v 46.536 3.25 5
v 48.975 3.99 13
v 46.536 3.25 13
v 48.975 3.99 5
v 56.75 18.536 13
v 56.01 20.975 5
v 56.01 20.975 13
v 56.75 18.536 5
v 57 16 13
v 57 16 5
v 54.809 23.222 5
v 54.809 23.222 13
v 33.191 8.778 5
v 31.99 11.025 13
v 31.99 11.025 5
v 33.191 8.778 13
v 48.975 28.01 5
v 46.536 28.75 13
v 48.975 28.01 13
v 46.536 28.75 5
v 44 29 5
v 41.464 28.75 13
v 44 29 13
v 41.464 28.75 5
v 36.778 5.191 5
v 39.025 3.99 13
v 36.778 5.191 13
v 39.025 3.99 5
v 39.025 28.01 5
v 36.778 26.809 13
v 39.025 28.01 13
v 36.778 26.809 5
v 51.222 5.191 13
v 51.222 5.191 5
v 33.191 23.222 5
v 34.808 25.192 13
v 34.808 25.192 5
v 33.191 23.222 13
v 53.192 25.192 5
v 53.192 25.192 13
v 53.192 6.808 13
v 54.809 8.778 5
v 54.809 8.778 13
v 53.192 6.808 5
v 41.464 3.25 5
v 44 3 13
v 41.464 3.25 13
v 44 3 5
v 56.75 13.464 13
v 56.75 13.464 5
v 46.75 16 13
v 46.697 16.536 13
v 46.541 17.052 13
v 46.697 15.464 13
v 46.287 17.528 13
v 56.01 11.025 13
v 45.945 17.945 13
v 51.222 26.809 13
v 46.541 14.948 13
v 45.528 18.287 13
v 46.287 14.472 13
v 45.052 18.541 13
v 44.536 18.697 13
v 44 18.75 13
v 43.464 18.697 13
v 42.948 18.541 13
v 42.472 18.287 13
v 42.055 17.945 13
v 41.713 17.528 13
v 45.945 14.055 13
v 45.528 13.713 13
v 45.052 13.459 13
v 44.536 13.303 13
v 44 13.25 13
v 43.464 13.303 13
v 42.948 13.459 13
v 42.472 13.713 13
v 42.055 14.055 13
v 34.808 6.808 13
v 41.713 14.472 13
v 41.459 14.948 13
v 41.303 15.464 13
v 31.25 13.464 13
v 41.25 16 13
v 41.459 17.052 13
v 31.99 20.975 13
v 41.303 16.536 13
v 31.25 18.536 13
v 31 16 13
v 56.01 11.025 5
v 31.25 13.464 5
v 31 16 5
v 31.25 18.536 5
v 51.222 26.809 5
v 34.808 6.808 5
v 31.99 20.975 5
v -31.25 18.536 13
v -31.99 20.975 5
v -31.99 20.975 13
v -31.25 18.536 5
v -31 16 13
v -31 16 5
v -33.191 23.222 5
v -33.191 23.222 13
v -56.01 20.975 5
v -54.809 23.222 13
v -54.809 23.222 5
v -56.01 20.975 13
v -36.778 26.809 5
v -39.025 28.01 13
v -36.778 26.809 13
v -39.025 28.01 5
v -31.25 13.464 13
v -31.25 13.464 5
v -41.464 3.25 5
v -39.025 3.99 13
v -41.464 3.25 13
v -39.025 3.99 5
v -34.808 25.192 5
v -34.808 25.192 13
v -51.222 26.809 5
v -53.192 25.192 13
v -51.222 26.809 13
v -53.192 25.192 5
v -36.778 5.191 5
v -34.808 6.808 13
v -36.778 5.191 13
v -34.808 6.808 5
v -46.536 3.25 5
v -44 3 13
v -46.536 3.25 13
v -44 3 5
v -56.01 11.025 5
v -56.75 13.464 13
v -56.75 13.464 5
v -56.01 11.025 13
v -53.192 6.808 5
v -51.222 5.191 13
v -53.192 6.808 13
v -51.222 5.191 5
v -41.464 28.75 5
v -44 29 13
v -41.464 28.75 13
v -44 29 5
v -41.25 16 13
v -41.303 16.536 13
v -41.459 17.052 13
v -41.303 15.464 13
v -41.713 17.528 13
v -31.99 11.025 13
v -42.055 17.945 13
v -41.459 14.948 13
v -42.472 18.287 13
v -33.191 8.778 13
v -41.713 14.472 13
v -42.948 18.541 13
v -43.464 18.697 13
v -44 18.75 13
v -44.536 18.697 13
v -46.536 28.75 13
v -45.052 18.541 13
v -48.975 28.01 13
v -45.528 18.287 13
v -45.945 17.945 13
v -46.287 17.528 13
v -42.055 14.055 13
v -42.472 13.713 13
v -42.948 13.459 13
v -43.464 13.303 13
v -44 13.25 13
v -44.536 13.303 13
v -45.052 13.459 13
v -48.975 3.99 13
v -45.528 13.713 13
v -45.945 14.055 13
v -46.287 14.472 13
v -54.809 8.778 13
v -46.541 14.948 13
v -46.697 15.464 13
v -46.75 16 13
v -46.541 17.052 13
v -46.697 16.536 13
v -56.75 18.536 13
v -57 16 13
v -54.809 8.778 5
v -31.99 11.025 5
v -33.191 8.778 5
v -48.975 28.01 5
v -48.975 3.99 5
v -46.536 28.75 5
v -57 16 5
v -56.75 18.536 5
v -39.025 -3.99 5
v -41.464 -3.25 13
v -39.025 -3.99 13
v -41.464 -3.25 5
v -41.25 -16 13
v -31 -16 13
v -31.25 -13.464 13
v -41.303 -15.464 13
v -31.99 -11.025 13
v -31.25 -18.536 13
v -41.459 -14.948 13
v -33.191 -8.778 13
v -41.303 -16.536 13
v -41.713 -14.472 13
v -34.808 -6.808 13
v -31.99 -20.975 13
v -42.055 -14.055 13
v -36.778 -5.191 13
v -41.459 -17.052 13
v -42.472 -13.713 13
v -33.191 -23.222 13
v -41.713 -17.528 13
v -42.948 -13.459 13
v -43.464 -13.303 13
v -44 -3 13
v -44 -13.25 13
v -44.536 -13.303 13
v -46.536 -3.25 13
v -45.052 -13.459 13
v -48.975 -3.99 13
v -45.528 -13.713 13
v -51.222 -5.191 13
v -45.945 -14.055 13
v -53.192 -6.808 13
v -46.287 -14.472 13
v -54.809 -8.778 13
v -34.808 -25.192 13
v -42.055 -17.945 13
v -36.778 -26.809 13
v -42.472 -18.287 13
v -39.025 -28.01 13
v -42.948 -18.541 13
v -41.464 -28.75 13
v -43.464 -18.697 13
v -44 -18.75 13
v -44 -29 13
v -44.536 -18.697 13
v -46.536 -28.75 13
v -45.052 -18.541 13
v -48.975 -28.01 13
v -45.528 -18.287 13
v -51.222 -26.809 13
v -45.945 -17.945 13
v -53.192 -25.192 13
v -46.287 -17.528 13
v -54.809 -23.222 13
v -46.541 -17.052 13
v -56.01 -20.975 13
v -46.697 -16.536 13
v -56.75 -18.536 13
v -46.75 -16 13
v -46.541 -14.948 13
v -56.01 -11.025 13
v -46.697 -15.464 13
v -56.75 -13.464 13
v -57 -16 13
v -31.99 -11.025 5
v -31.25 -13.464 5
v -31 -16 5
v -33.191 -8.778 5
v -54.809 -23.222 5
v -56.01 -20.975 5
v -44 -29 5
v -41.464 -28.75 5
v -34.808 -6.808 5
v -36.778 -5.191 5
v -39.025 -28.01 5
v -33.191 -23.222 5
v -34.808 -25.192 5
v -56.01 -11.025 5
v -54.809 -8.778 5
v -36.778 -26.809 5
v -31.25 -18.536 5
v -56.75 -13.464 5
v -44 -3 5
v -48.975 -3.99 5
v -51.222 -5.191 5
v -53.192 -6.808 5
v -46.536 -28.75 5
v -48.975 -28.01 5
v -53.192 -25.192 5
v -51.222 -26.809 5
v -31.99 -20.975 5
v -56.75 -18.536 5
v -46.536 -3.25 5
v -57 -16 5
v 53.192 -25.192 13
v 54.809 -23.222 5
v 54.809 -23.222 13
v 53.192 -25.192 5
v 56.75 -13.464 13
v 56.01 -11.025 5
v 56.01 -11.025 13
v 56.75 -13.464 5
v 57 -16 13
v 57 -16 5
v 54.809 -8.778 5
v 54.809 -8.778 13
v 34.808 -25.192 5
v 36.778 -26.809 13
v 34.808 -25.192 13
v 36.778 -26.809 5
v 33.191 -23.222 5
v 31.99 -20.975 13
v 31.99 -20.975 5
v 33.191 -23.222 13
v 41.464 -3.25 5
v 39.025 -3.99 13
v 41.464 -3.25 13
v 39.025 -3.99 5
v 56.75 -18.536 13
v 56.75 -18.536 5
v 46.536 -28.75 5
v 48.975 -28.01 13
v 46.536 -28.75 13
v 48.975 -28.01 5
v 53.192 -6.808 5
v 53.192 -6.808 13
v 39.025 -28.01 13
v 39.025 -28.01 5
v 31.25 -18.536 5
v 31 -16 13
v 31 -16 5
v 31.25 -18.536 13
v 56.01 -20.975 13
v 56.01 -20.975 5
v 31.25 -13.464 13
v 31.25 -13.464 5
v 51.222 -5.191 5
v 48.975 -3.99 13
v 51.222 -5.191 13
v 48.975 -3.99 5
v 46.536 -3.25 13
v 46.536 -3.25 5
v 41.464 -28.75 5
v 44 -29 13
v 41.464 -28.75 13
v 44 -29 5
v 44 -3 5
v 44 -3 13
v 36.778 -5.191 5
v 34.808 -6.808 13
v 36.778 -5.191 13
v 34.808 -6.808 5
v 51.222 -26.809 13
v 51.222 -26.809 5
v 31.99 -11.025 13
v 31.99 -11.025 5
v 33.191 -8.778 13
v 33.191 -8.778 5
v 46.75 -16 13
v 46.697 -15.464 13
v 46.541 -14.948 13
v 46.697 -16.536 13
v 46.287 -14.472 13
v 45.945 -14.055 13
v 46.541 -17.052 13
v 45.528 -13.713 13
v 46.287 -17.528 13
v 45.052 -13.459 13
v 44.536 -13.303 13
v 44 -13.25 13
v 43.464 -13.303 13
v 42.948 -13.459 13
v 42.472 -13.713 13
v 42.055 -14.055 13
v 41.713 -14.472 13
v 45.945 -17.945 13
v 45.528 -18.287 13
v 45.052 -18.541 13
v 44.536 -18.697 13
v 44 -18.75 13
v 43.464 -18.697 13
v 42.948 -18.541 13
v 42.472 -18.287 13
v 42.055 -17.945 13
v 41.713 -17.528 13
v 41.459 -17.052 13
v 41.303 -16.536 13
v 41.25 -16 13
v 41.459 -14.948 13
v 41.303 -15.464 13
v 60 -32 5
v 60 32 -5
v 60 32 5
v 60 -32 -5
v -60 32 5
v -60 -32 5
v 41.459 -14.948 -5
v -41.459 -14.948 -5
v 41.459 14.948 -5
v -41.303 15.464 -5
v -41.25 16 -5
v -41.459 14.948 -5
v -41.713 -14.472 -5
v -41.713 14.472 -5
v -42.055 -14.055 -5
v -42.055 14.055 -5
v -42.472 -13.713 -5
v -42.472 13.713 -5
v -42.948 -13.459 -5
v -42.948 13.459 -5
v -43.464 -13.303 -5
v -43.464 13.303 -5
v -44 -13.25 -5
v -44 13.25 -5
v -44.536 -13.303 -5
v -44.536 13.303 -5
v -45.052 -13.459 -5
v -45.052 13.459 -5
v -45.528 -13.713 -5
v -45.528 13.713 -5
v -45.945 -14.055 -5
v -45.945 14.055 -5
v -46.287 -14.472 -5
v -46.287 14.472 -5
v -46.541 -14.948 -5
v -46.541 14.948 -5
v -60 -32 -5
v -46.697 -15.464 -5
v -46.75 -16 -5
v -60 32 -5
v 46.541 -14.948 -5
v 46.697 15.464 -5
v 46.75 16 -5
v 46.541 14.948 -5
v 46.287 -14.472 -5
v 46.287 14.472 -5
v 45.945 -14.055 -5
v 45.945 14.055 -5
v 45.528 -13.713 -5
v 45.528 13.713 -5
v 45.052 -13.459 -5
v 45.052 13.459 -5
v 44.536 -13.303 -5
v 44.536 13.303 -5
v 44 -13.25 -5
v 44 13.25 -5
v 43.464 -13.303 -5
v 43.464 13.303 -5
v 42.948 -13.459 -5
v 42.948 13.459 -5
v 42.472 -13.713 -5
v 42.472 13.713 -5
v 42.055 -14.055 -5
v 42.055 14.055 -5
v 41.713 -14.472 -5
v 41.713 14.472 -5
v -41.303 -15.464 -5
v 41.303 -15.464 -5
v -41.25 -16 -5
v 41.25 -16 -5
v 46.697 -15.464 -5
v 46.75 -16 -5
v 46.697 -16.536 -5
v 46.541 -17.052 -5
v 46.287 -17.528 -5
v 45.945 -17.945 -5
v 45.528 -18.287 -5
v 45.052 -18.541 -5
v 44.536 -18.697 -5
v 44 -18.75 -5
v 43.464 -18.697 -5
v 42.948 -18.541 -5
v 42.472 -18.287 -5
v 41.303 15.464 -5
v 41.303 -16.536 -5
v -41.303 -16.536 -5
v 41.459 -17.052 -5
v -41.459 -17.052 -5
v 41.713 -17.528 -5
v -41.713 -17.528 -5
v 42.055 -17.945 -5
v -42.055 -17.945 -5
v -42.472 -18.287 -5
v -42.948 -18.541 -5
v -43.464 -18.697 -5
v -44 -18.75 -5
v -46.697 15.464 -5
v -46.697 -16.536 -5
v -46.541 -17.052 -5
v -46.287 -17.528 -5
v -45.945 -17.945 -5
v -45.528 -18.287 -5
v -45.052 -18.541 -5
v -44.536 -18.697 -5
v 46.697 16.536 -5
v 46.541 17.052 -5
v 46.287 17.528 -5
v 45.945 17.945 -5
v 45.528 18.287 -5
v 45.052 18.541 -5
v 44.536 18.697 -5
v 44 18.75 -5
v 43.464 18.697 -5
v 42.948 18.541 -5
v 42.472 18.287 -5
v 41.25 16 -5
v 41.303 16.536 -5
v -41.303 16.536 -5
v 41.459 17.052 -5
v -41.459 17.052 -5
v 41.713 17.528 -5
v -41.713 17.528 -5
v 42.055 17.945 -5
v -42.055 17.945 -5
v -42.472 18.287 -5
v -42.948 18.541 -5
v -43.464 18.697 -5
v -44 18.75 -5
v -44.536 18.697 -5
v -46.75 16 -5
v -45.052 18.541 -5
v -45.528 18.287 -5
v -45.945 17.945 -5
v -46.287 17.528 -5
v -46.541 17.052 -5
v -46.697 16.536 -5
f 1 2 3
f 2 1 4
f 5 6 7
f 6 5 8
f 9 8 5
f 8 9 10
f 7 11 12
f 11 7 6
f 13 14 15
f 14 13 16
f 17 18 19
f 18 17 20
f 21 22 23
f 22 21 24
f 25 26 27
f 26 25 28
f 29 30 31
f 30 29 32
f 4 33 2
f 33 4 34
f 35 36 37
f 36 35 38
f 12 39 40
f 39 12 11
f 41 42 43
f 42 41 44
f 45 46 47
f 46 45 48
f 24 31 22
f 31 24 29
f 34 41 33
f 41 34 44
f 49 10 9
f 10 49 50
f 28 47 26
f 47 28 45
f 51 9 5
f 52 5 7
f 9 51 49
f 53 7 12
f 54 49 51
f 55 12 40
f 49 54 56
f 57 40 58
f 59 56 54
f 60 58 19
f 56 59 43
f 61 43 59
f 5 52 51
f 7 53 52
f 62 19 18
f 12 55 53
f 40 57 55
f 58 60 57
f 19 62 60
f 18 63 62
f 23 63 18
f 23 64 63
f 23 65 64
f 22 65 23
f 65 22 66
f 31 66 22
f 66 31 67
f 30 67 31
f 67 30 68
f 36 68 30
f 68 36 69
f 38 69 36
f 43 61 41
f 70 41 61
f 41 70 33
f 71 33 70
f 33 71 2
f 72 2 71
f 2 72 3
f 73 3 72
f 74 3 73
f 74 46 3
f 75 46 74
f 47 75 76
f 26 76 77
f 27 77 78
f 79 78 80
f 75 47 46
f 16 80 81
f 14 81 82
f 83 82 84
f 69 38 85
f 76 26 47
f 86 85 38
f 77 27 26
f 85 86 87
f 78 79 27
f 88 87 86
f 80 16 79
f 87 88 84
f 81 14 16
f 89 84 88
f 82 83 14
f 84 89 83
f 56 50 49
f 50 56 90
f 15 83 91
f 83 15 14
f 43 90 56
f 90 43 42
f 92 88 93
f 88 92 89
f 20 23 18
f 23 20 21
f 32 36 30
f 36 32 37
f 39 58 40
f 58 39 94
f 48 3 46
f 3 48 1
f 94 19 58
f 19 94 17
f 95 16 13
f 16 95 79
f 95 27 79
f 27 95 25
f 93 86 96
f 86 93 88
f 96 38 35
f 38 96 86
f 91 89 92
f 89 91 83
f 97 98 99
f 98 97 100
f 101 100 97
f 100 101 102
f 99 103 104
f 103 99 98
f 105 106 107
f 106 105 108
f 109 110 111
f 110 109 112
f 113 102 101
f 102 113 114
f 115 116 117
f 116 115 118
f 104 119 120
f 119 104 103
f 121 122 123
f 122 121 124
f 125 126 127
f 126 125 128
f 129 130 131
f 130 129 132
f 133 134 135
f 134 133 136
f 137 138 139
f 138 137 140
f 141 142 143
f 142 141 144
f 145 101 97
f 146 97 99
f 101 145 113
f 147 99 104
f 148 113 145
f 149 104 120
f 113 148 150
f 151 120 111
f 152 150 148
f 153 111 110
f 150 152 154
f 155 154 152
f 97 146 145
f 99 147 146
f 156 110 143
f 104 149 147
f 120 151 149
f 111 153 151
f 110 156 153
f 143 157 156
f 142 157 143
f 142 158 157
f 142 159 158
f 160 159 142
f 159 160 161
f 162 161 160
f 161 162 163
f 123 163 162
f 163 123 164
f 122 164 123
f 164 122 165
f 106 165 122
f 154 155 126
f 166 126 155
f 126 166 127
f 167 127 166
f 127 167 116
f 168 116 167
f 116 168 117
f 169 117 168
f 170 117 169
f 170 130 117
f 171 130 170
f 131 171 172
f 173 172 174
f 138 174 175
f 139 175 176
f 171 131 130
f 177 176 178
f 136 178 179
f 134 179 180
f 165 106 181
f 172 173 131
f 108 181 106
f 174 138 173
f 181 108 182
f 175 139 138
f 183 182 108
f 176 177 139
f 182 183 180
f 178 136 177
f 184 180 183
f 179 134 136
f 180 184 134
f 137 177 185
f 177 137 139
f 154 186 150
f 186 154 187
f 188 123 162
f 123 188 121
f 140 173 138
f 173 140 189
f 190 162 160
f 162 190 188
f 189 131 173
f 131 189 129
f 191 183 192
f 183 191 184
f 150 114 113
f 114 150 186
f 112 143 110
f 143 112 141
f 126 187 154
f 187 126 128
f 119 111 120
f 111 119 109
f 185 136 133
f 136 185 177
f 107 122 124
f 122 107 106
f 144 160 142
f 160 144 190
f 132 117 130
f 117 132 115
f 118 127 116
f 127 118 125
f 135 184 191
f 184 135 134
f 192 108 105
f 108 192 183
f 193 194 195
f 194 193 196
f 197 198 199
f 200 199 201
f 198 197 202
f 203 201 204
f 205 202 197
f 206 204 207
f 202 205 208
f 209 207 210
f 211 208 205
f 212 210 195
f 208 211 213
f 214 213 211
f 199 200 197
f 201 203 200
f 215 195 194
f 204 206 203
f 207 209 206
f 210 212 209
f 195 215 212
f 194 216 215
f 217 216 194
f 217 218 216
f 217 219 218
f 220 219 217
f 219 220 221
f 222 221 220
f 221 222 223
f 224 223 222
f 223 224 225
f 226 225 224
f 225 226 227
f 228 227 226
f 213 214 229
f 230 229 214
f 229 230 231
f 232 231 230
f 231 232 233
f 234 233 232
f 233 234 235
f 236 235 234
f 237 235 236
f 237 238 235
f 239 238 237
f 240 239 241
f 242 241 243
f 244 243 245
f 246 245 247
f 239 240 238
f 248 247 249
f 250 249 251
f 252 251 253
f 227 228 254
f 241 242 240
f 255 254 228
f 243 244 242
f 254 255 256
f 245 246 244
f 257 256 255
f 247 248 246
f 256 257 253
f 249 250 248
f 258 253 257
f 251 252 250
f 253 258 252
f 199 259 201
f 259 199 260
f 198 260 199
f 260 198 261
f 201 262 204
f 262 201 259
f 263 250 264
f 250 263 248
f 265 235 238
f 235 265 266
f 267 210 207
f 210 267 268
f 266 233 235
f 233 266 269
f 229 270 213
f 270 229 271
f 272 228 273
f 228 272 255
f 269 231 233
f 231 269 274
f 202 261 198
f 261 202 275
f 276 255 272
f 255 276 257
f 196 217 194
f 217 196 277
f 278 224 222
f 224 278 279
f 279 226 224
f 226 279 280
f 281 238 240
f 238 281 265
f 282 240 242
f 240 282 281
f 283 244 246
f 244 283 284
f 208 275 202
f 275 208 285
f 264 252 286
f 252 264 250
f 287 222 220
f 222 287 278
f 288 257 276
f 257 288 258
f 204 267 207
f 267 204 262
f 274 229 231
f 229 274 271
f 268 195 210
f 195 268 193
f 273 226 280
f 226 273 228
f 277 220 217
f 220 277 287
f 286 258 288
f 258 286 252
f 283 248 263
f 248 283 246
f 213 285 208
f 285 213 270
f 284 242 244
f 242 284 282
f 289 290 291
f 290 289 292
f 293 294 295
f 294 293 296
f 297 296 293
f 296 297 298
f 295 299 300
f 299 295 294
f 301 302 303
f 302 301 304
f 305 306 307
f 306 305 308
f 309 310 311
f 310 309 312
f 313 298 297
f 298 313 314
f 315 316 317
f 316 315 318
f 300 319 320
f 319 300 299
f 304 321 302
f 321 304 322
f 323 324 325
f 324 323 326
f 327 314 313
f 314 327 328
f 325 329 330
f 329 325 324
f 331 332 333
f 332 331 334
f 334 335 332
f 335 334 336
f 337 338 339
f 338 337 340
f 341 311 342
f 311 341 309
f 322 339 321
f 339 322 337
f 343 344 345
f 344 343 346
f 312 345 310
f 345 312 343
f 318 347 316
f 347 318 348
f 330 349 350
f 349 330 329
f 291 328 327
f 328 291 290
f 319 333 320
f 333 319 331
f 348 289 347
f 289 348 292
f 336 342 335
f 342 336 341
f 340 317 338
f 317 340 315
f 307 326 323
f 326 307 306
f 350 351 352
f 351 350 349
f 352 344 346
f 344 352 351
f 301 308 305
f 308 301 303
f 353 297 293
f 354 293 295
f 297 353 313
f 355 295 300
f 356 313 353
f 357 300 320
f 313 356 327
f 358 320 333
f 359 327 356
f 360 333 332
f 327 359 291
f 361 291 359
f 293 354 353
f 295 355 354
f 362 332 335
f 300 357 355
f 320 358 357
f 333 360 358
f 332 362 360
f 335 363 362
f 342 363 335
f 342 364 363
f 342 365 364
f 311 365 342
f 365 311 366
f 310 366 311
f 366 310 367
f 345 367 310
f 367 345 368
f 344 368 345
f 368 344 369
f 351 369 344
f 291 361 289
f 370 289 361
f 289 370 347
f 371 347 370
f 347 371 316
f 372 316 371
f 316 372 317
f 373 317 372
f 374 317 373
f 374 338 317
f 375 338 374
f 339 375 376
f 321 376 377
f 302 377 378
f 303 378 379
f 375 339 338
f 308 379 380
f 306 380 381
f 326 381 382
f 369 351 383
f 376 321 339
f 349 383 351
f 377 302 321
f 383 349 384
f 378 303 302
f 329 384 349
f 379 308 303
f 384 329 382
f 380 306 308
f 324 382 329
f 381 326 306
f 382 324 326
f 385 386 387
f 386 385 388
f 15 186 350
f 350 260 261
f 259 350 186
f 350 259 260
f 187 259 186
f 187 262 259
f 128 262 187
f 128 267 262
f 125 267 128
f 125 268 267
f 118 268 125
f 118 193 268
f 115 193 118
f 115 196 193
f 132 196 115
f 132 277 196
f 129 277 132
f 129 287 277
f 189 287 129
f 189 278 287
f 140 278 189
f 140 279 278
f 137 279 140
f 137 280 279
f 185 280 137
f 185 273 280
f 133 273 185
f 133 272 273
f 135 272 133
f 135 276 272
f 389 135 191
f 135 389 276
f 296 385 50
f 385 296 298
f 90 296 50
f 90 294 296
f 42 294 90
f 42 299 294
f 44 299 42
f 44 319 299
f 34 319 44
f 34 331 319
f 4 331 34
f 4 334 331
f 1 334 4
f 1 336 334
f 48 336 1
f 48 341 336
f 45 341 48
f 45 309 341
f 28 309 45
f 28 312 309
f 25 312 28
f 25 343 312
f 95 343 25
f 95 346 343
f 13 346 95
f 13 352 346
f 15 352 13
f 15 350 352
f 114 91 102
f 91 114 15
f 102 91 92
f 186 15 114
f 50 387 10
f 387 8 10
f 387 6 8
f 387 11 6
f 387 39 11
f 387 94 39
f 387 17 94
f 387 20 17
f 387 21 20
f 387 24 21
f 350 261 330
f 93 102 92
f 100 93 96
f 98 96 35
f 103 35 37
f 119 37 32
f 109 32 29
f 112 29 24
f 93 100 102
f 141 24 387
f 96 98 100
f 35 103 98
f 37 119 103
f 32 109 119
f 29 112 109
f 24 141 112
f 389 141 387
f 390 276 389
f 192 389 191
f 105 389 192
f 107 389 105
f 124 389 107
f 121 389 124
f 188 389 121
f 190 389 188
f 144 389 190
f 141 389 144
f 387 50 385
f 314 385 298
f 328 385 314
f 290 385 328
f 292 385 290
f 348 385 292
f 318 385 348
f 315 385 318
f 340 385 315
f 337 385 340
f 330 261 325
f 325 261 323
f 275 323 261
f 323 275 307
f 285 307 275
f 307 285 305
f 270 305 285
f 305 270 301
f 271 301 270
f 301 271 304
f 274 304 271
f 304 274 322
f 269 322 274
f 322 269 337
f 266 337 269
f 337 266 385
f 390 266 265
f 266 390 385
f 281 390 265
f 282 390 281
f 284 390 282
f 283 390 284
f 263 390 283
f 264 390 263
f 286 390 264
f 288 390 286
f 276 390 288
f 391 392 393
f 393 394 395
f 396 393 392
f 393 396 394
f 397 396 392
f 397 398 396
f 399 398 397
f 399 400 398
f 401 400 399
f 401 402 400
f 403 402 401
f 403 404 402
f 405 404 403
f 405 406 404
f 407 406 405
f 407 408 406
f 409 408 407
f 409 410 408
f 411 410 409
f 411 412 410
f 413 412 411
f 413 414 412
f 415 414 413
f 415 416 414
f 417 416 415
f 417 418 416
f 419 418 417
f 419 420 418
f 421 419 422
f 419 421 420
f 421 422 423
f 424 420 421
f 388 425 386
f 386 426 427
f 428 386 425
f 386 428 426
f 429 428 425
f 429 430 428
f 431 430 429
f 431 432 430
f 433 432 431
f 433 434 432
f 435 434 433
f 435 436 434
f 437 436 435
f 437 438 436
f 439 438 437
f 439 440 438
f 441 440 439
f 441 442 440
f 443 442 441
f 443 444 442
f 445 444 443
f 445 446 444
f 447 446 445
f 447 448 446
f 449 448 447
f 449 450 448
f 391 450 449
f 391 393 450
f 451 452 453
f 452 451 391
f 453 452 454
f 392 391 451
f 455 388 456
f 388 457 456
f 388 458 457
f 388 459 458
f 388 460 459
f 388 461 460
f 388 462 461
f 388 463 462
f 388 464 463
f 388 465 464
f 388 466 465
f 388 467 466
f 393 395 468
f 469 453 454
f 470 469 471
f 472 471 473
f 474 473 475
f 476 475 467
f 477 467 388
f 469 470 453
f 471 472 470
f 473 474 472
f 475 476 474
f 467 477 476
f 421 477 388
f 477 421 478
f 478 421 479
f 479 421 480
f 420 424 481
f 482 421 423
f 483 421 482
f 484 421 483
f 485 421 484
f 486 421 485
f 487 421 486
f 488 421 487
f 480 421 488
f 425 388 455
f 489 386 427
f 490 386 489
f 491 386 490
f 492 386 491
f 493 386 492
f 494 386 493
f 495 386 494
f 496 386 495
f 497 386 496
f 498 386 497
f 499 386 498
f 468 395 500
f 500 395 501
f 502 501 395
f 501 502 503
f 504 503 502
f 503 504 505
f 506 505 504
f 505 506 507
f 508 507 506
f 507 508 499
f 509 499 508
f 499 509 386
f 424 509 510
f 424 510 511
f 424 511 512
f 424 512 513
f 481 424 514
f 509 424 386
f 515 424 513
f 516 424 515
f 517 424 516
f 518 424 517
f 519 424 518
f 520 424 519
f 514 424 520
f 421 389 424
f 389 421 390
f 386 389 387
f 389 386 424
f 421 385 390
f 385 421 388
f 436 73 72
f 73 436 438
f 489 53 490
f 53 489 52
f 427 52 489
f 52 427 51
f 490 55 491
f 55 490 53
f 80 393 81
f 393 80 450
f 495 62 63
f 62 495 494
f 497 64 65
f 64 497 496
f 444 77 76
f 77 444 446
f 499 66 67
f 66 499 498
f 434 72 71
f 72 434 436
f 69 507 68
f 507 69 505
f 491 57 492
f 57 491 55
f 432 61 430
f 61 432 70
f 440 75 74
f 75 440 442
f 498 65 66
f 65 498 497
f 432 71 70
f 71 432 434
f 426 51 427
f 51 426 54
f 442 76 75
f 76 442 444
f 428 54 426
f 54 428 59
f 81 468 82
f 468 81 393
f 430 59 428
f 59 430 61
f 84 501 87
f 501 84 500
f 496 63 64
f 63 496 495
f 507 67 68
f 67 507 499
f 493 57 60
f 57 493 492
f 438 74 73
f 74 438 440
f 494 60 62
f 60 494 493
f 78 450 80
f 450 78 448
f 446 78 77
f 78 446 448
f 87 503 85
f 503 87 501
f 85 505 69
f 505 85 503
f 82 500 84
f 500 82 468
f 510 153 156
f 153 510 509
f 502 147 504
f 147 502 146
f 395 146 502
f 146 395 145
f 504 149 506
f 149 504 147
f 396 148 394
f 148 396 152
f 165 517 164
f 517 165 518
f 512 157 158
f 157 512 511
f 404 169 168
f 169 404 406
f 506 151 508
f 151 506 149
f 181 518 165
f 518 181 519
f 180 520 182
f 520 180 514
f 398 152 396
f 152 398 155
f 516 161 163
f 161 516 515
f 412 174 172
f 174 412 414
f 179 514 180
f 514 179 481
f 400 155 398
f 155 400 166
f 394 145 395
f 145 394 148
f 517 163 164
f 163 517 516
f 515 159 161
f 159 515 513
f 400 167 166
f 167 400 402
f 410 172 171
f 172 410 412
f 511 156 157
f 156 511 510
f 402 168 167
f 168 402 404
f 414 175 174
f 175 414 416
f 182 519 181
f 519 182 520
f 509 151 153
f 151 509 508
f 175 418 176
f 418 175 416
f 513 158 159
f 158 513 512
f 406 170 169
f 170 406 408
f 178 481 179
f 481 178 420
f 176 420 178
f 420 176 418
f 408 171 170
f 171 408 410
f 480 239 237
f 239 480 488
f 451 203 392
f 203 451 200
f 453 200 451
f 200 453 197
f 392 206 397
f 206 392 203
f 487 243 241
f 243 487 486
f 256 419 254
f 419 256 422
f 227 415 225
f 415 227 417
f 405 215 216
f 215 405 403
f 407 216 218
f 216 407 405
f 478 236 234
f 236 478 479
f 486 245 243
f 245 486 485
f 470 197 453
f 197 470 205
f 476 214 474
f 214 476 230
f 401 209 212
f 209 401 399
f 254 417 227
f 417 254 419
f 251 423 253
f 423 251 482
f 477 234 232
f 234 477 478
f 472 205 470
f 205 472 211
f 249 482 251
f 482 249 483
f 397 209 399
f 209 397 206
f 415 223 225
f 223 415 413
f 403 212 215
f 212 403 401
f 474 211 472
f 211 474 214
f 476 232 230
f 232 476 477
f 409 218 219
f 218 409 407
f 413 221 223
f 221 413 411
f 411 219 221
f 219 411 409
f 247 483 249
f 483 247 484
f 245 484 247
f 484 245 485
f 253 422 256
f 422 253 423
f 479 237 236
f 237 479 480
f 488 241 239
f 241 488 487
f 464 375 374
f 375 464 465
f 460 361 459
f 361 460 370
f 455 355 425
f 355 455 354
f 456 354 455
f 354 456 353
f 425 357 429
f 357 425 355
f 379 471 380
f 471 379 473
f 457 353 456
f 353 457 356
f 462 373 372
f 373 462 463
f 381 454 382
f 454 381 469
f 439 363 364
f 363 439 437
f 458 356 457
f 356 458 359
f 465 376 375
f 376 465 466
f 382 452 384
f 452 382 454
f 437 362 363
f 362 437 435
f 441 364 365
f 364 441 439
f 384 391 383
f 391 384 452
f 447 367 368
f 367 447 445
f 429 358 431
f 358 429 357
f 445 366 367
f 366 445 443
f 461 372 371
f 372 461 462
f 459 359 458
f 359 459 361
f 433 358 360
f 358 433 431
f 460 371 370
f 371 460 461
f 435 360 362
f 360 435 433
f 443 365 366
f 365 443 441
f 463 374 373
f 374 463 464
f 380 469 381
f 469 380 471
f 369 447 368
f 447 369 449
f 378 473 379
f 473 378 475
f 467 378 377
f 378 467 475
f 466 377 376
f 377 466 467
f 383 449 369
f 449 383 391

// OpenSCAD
$fn = 32;

// ----------------------------------------------------------------------
// Anchor pads 120 x 64 x 18
// four corner bosses with anchor holes
// ----------------------------------------------------------------------

// --- parameters (mm) ---
plate = [120, 64, 10];  // base plate size (x, y, z)
pads = 4;               // boss count, one per corner
edge = 16;              // boss centre offset from the plate edge
boss_d = 26;            // boss diameter
boss_h = 8;             // boss height above the base plate
hole_d = 5.5;           // hole diameter

// --- derived feature positions (mm) ---
height = plate[2] + boss_h;      // = 18   overall height of the part
corner_x = plate[0] / 2 - edge;  // = 44   boss centre X
corner_y = plate[1] / 2 - edge;  // = 16   boss centre Y
feature_centers = [
  [corner_x, corner_y],
  [-corner_x, corner_y],
  [-corner_x, -corner_y],
  [corner_x, -corner_y]
];   // boss centres, anchor holes are drilled there

// base plate, four bosses standing on it, anchor holes all the way through
difference() {
  union() {
    cube(plate, center = true);
    for (centre = feature_centers)
      translate([centre[0], centre[1], plate[2] / 2 - 1])
        cylinder(d = boss_d, h = boss_h + 1);
  }
  for (centre = feature_centers)
    translate([centre[0], centre[1], -height])
      cylinder(d = hole_d, h = 2 * height + 2);  // through boss and plate
}
